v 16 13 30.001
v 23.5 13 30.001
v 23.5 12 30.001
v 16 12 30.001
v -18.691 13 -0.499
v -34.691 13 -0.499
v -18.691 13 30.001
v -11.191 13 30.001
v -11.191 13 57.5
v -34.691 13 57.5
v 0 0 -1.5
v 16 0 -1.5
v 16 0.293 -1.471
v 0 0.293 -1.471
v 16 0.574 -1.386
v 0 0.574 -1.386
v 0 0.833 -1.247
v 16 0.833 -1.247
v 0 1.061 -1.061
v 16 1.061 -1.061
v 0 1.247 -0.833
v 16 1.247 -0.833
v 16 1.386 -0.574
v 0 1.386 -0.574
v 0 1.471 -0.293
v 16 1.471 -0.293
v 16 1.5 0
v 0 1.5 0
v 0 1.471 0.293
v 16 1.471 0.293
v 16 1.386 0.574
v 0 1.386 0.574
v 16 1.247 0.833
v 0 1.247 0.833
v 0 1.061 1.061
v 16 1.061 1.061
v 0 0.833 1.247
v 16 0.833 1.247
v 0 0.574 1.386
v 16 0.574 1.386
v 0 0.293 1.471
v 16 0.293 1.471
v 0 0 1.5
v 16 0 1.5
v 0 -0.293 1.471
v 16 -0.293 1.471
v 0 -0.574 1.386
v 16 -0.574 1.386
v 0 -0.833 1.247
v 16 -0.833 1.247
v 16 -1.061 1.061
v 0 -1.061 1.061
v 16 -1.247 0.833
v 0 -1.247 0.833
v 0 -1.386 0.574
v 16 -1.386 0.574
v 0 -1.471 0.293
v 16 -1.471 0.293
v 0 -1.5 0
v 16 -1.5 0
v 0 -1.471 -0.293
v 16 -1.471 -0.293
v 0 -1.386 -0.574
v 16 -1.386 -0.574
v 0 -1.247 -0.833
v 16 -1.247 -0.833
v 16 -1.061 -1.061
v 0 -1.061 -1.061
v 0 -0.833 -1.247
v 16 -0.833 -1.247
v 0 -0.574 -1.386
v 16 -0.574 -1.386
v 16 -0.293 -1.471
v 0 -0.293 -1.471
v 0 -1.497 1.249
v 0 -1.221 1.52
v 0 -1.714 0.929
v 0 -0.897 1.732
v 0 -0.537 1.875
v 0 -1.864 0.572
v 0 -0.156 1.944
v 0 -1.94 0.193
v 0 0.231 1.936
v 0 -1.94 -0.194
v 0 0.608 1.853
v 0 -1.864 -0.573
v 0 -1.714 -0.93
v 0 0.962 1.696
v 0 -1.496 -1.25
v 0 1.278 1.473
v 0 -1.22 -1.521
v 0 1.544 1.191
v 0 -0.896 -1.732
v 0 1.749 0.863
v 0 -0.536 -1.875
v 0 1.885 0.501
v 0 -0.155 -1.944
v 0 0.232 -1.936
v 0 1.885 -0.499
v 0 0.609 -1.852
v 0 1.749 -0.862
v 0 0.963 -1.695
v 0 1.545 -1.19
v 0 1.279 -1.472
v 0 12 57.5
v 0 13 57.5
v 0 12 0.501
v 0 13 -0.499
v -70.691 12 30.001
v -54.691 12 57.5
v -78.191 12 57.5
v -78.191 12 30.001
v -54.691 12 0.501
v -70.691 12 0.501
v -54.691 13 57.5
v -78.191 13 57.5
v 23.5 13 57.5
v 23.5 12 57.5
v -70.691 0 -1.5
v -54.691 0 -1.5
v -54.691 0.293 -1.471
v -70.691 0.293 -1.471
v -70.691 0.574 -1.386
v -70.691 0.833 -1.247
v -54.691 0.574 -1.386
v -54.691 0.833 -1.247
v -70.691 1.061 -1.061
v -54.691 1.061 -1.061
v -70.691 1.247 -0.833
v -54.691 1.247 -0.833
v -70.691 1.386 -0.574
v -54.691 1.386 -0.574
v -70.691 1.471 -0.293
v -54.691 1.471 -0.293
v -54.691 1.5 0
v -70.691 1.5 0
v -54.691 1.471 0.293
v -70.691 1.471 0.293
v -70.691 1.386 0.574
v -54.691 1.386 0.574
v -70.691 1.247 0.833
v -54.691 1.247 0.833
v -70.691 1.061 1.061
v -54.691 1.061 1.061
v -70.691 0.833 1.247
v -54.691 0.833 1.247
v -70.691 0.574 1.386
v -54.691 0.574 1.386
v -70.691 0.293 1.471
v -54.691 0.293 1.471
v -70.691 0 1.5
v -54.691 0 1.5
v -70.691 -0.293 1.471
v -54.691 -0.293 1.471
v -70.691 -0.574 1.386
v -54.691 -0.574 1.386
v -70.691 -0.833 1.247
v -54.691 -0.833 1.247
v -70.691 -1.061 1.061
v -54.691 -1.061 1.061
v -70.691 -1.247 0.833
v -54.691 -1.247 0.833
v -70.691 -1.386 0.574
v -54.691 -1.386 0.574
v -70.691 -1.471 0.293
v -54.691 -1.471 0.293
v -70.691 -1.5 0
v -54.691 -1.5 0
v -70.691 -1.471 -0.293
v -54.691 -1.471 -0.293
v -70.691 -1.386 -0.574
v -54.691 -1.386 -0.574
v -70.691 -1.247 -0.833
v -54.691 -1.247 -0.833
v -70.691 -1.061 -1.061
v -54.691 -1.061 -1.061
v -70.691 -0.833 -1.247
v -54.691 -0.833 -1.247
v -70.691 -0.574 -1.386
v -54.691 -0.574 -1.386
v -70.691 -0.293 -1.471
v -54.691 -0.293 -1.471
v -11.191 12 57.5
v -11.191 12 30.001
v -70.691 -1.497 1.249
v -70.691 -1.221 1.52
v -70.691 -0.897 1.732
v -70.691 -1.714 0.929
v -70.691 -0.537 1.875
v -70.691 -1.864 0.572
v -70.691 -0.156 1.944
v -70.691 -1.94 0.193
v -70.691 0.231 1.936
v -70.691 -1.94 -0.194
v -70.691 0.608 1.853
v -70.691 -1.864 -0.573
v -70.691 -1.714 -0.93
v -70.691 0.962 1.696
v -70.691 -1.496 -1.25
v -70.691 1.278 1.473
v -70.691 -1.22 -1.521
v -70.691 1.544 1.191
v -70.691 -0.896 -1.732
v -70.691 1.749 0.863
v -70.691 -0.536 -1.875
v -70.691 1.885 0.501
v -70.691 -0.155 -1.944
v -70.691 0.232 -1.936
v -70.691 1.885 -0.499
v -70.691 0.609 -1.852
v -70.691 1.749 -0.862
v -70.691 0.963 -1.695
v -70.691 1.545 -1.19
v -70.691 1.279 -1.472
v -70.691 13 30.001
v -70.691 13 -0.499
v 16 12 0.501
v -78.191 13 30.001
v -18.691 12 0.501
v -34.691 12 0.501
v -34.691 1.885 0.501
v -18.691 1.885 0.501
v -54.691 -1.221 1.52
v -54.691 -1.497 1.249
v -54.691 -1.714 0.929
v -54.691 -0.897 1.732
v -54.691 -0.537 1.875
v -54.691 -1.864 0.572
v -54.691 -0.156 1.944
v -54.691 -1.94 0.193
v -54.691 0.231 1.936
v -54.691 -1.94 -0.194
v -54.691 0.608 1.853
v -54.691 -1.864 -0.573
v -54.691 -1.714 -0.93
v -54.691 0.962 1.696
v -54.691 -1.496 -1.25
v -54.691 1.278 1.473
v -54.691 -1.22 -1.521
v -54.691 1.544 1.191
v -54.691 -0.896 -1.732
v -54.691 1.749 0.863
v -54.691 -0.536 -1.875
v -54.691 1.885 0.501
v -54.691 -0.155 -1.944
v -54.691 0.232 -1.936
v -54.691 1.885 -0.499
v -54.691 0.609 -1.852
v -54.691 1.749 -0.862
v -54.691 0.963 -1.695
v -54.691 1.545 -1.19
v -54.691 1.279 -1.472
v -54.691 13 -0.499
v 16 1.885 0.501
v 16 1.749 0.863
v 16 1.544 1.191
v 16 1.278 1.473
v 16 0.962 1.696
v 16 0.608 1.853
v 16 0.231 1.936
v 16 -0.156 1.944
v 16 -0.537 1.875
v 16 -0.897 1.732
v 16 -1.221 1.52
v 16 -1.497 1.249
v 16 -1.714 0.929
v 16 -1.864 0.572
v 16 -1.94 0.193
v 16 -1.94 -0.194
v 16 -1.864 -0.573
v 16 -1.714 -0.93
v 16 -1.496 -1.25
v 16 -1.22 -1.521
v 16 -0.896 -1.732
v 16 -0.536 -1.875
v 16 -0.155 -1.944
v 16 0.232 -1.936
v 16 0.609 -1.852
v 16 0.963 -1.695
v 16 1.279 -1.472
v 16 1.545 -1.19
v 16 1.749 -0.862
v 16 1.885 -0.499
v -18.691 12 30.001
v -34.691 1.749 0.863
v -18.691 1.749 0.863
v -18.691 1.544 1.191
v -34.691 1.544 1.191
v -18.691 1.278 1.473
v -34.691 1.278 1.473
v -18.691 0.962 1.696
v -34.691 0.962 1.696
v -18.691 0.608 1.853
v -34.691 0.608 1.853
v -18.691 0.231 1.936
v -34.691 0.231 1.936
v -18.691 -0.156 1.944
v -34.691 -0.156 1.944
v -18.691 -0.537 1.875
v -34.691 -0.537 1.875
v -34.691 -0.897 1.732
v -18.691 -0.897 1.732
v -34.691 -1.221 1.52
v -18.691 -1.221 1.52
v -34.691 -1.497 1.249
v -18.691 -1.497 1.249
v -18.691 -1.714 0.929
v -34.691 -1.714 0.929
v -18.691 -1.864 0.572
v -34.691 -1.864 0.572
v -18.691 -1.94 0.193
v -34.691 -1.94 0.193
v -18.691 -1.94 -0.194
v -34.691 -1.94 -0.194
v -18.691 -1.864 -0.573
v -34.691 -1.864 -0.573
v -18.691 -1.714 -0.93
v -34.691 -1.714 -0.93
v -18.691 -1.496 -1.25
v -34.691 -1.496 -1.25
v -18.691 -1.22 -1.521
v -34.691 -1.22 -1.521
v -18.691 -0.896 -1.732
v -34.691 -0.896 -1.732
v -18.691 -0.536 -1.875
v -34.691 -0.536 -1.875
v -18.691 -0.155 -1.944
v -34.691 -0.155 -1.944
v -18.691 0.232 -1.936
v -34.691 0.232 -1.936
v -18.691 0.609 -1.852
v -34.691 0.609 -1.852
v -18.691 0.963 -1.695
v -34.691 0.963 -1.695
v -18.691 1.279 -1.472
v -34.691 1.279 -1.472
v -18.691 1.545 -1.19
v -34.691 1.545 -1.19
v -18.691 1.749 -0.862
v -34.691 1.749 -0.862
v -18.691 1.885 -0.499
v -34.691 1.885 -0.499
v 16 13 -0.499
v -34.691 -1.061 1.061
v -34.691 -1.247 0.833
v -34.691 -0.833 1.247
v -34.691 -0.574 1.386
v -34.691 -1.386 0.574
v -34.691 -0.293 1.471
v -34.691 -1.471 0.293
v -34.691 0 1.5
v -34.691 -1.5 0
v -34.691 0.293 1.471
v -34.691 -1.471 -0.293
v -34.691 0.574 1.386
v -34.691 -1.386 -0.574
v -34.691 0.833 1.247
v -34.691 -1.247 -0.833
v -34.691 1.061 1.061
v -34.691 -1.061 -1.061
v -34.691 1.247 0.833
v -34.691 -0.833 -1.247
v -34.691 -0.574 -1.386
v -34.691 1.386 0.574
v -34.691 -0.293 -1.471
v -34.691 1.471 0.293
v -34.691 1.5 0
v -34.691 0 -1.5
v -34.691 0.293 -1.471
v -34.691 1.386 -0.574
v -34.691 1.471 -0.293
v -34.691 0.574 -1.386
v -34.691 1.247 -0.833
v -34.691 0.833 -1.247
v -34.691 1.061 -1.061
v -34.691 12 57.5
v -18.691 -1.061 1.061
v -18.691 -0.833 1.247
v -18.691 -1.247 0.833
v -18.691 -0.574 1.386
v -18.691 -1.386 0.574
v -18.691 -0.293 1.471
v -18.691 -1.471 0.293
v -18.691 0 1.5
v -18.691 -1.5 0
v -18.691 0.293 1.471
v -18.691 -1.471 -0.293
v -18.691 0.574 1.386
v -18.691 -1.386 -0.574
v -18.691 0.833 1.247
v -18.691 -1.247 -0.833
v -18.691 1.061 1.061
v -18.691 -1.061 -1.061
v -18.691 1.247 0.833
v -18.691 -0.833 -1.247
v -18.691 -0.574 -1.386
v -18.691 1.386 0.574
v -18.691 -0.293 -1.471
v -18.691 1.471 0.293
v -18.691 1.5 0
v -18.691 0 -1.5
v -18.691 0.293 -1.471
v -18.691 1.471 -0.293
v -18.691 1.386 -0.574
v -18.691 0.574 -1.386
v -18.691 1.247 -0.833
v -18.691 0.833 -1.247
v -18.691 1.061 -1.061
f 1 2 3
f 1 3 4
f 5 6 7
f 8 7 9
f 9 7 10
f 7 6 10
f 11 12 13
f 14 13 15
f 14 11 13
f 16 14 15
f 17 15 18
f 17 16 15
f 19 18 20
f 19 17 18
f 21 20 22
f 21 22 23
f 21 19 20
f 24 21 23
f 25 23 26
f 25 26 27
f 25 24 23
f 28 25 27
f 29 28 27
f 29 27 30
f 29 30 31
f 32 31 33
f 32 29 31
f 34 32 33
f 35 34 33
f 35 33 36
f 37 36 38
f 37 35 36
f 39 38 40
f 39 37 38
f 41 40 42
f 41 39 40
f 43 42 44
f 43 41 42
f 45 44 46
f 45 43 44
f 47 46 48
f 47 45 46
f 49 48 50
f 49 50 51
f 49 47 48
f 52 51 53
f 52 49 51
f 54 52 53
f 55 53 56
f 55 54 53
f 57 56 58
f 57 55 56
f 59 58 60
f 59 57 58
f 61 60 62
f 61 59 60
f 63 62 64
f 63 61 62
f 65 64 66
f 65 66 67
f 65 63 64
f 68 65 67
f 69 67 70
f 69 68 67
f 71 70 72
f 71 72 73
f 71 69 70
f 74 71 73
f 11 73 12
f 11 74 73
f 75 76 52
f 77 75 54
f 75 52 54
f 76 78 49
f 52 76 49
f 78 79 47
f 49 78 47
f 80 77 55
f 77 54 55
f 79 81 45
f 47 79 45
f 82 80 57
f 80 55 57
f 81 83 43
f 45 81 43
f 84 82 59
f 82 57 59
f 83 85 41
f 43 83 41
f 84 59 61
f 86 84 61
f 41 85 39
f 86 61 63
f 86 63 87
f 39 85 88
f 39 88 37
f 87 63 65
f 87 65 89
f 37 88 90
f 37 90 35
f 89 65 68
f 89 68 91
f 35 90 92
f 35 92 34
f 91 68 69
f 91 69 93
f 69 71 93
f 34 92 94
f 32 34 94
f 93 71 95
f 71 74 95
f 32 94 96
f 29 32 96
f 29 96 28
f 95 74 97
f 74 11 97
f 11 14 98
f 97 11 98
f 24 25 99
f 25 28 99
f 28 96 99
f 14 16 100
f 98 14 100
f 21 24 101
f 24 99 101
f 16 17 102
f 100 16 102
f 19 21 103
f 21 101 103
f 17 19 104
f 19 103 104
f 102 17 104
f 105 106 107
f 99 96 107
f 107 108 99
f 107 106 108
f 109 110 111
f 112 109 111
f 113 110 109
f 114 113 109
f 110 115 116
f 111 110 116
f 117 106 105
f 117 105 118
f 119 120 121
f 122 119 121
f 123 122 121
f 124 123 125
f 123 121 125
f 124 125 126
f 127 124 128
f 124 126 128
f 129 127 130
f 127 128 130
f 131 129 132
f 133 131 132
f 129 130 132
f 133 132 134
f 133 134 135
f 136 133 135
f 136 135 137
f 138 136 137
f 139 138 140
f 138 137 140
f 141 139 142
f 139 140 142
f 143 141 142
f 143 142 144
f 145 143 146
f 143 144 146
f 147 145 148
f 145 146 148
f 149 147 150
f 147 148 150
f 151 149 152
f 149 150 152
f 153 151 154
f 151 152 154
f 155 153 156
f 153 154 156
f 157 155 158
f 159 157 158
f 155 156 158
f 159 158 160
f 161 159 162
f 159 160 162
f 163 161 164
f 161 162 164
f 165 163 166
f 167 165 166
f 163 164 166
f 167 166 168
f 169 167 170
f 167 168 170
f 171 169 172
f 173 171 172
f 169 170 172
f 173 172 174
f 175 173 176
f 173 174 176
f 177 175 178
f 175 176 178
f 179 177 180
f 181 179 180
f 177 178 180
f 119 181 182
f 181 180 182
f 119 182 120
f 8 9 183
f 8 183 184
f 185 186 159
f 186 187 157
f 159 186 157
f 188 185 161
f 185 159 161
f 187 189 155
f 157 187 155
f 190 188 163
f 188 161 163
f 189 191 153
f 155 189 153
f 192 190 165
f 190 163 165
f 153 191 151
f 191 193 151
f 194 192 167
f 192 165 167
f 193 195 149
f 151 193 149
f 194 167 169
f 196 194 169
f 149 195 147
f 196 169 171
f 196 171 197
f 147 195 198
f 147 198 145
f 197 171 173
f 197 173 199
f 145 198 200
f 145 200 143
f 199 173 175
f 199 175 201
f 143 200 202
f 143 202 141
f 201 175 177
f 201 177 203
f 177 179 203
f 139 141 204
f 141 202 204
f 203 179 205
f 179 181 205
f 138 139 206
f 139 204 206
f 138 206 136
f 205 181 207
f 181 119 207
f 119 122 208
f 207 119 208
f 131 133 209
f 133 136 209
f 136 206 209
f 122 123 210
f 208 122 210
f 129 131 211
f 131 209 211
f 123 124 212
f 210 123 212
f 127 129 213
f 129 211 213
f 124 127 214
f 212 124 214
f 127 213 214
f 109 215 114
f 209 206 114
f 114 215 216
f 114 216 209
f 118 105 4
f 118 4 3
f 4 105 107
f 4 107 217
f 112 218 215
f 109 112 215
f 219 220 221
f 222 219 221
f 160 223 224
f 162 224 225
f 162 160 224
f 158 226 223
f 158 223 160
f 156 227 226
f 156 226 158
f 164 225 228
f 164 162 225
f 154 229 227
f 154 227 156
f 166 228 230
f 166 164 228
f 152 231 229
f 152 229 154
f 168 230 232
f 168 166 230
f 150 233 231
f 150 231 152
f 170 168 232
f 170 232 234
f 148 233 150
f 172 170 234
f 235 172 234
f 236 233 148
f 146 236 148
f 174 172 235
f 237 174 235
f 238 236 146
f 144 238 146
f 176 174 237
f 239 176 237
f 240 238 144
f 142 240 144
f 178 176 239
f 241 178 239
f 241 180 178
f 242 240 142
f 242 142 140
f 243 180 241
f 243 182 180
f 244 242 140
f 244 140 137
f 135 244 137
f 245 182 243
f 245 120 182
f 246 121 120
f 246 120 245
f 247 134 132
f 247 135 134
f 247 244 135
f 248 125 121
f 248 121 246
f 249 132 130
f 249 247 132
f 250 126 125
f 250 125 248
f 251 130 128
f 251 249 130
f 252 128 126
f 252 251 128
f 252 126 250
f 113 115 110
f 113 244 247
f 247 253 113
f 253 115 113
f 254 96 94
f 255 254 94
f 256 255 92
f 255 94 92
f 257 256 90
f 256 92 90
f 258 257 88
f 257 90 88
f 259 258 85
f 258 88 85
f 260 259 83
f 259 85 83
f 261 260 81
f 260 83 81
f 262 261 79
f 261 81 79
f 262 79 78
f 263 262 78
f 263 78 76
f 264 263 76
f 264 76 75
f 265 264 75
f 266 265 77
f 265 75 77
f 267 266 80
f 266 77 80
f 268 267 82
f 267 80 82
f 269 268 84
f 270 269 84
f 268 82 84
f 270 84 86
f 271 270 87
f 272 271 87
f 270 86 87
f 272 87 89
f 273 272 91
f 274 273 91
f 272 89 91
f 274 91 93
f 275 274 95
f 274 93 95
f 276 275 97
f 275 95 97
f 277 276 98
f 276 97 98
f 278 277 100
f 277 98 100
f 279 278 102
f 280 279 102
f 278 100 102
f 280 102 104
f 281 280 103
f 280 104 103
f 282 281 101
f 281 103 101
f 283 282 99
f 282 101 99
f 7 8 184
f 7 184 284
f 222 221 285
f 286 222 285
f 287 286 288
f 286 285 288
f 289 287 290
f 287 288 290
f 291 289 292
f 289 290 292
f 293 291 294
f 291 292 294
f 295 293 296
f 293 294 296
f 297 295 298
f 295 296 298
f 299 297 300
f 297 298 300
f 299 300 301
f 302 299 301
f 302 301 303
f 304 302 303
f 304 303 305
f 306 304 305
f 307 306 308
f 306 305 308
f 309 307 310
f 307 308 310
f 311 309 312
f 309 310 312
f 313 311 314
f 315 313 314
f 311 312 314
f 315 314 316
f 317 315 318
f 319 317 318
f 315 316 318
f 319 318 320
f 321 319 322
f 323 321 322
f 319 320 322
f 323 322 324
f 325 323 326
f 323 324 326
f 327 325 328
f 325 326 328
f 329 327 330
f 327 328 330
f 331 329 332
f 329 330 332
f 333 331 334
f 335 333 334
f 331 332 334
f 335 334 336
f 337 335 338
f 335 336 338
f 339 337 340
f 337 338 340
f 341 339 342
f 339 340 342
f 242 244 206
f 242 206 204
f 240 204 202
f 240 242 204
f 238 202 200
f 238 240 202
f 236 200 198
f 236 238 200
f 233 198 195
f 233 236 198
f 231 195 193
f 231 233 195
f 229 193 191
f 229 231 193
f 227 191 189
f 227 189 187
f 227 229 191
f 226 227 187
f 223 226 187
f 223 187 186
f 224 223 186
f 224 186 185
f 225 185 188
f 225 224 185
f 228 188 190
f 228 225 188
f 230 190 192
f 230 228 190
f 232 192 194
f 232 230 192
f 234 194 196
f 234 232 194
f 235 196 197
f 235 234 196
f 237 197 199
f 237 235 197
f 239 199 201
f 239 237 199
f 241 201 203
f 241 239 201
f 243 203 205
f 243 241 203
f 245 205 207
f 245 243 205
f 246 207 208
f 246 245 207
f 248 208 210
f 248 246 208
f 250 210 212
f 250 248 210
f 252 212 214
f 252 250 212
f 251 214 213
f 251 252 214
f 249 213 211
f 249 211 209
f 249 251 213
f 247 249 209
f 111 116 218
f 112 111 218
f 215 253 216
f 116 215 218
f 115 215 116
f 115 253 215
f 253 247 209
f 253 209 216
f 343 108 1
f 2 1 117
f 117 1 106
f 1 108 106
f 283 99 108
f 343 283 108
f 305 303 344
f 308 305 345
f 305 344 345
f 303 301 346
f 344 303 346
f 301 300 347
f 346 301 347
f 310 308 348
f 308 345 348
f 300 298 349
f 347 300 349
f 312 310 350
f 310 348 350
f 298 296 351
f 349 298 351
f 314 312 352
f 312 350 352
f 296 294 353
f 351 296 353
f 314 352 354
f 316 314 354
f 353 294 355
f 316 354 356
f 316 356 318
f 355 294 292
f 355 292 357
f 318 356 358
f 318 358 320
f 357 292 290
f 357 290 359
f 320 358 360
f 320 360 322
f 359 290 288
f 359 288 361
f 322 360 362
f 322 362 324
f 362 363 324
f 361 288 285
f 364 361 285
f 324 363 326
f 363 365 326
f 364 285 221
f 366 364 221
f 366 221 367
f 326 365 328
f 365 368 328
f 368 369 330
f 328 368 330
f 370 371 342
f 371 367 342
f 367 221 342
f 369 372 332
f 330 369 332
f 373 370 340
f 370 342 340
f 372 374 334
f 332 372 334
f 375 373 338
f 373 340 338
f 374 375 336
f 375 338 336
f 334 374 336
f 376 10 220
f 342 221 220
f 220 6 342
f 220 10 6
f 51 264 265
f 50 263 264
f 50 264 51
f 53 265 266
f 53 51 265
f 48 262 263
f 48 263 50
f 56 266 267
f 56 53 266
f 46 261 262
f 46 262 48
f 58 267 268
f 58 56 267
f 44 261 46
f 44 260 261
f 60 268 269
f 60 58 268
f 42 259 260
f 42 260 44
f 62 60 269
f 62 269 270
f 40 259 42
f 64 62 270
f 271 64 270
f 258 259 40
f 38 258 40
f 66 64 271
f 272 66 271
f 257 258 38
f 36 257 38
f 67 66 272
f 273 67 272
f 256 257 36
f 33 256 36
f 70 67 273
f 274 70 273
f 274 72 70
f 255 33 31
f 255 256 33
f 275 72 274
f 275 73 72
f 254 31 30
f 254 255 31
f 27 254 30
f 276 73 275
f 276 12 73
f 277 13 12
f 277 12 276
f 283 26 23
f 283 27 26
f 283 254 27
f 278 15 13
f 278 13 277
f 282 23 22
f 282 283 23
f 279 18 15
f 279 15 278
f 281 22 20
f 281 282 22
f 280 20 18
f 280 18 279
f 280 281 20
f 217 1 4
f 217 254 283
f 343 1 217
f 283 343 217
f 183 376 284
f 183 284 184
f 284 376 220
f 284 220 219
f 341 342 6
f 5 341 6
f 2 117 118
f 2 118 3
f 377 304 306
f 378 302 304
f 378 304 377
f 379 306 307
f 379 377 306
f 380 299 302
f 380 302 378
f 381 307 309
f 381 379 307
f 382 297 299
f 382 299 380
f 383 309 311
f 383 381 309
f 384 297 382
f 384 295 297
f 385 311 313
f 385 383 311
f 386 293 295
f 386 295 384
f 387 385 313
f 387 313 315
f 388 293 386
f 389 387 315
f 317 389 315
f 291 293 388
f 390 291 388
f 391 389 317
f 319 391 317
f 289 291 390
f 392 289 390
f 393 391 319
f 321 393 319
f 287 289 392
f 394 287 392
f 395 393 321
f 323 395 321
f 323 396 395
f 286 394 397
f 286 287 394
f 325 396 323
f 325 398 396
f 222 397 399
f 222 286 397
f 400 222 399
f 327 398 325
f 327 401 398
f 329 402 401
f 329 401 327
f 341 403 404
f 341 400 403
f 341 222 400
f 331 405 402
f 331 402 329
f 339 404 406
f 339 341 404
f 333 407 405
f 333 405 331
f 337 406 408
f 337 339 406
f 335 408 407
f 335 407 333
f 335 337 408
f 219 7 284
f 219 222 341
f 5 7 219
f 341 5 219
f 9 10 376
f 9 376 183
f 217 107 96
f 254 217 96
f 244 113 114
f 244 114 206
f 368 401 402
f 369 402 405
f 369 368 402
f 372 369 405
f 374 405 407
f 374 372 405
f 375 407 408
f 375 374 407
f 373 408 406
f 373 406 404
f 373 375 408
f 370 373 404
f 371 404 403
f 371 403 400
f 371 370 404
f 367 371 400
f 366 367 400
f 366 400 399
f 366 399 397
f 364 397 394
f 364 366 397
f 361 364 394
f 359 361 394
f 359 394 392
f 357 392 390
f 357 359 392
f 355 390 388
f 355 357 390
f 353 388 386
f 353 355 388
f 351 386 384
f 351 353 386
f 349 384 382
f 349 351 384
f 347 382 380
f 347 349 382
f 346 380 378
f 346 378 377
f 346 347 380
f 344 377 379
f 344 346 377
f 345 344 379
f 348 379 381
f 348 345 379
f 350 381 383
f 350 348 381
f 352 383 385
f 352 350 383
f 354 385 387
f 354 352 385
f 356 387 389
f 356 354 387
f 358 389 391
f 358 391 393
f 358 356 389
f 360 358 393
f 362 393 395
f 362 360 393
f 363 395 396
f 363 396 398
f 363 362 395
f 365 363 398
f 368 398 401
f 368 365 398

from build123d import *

# Parameters (mm, degrees)
SKETCH1_R           = 1.5
BOSS_EXTRUDE1_DEPTH = 16
BOSS_EXTRUDE2_DEPTH = 1


with BuildPart() as part:
    # Sketch1 → Boss-Extrude1 (new body)
    with BuildSketch(Plane(origin=(0, 0, 0), x_dir=(0, 0, -1), z_dir=(1, 0, 0))):
        with BuildLine():
            Line((0.49946551, 13), (-0.50053449, 13))
            Line((-0.50053449, 13), (-0.50053449, 1.884665812))
            ThreePointArc((-0.50053449, 1.884665812), (0.000552977, -1.949999922), (0.49946551, 1.88494939))
            Line((0.49946551, 1.88494939), (0.49946551, 13))
        make_face()
        Circle(SKETCH1_R, mode=Mode.SUBTRACT)
    extrude(amount=BOSS_EXTRUDE1_DEPTH)

    # Sketch2 → Boss-Extrude2 (add)
    with BuildSketch(Plane(origin=(0, 13, 0), x_dir=(1, 0, 0), z_dir=(0, 1, 0))):
        Polygon((0, 0), (0, -57.5), (23.5, -57.5), (23.5, -30.00053449), (16, -30.00053449), (16, -0.00053449), align=None)
    extrude(amount=-BOSS_EXTRUDE2_DEPTH)


with BuildPart() as body_2:
    # Body-Move/Copy2: copy of part
    add(part.part.moved(Location((-34.690892156, 0, 0))))


with BuildPart() as body_3:
    # Mirror4: mirrored copy
    add(body_2.part.mirror(Plane.ZY.offset(44.690892156)))


solid = Compound([part.part, body_2.part, body_3.part])
